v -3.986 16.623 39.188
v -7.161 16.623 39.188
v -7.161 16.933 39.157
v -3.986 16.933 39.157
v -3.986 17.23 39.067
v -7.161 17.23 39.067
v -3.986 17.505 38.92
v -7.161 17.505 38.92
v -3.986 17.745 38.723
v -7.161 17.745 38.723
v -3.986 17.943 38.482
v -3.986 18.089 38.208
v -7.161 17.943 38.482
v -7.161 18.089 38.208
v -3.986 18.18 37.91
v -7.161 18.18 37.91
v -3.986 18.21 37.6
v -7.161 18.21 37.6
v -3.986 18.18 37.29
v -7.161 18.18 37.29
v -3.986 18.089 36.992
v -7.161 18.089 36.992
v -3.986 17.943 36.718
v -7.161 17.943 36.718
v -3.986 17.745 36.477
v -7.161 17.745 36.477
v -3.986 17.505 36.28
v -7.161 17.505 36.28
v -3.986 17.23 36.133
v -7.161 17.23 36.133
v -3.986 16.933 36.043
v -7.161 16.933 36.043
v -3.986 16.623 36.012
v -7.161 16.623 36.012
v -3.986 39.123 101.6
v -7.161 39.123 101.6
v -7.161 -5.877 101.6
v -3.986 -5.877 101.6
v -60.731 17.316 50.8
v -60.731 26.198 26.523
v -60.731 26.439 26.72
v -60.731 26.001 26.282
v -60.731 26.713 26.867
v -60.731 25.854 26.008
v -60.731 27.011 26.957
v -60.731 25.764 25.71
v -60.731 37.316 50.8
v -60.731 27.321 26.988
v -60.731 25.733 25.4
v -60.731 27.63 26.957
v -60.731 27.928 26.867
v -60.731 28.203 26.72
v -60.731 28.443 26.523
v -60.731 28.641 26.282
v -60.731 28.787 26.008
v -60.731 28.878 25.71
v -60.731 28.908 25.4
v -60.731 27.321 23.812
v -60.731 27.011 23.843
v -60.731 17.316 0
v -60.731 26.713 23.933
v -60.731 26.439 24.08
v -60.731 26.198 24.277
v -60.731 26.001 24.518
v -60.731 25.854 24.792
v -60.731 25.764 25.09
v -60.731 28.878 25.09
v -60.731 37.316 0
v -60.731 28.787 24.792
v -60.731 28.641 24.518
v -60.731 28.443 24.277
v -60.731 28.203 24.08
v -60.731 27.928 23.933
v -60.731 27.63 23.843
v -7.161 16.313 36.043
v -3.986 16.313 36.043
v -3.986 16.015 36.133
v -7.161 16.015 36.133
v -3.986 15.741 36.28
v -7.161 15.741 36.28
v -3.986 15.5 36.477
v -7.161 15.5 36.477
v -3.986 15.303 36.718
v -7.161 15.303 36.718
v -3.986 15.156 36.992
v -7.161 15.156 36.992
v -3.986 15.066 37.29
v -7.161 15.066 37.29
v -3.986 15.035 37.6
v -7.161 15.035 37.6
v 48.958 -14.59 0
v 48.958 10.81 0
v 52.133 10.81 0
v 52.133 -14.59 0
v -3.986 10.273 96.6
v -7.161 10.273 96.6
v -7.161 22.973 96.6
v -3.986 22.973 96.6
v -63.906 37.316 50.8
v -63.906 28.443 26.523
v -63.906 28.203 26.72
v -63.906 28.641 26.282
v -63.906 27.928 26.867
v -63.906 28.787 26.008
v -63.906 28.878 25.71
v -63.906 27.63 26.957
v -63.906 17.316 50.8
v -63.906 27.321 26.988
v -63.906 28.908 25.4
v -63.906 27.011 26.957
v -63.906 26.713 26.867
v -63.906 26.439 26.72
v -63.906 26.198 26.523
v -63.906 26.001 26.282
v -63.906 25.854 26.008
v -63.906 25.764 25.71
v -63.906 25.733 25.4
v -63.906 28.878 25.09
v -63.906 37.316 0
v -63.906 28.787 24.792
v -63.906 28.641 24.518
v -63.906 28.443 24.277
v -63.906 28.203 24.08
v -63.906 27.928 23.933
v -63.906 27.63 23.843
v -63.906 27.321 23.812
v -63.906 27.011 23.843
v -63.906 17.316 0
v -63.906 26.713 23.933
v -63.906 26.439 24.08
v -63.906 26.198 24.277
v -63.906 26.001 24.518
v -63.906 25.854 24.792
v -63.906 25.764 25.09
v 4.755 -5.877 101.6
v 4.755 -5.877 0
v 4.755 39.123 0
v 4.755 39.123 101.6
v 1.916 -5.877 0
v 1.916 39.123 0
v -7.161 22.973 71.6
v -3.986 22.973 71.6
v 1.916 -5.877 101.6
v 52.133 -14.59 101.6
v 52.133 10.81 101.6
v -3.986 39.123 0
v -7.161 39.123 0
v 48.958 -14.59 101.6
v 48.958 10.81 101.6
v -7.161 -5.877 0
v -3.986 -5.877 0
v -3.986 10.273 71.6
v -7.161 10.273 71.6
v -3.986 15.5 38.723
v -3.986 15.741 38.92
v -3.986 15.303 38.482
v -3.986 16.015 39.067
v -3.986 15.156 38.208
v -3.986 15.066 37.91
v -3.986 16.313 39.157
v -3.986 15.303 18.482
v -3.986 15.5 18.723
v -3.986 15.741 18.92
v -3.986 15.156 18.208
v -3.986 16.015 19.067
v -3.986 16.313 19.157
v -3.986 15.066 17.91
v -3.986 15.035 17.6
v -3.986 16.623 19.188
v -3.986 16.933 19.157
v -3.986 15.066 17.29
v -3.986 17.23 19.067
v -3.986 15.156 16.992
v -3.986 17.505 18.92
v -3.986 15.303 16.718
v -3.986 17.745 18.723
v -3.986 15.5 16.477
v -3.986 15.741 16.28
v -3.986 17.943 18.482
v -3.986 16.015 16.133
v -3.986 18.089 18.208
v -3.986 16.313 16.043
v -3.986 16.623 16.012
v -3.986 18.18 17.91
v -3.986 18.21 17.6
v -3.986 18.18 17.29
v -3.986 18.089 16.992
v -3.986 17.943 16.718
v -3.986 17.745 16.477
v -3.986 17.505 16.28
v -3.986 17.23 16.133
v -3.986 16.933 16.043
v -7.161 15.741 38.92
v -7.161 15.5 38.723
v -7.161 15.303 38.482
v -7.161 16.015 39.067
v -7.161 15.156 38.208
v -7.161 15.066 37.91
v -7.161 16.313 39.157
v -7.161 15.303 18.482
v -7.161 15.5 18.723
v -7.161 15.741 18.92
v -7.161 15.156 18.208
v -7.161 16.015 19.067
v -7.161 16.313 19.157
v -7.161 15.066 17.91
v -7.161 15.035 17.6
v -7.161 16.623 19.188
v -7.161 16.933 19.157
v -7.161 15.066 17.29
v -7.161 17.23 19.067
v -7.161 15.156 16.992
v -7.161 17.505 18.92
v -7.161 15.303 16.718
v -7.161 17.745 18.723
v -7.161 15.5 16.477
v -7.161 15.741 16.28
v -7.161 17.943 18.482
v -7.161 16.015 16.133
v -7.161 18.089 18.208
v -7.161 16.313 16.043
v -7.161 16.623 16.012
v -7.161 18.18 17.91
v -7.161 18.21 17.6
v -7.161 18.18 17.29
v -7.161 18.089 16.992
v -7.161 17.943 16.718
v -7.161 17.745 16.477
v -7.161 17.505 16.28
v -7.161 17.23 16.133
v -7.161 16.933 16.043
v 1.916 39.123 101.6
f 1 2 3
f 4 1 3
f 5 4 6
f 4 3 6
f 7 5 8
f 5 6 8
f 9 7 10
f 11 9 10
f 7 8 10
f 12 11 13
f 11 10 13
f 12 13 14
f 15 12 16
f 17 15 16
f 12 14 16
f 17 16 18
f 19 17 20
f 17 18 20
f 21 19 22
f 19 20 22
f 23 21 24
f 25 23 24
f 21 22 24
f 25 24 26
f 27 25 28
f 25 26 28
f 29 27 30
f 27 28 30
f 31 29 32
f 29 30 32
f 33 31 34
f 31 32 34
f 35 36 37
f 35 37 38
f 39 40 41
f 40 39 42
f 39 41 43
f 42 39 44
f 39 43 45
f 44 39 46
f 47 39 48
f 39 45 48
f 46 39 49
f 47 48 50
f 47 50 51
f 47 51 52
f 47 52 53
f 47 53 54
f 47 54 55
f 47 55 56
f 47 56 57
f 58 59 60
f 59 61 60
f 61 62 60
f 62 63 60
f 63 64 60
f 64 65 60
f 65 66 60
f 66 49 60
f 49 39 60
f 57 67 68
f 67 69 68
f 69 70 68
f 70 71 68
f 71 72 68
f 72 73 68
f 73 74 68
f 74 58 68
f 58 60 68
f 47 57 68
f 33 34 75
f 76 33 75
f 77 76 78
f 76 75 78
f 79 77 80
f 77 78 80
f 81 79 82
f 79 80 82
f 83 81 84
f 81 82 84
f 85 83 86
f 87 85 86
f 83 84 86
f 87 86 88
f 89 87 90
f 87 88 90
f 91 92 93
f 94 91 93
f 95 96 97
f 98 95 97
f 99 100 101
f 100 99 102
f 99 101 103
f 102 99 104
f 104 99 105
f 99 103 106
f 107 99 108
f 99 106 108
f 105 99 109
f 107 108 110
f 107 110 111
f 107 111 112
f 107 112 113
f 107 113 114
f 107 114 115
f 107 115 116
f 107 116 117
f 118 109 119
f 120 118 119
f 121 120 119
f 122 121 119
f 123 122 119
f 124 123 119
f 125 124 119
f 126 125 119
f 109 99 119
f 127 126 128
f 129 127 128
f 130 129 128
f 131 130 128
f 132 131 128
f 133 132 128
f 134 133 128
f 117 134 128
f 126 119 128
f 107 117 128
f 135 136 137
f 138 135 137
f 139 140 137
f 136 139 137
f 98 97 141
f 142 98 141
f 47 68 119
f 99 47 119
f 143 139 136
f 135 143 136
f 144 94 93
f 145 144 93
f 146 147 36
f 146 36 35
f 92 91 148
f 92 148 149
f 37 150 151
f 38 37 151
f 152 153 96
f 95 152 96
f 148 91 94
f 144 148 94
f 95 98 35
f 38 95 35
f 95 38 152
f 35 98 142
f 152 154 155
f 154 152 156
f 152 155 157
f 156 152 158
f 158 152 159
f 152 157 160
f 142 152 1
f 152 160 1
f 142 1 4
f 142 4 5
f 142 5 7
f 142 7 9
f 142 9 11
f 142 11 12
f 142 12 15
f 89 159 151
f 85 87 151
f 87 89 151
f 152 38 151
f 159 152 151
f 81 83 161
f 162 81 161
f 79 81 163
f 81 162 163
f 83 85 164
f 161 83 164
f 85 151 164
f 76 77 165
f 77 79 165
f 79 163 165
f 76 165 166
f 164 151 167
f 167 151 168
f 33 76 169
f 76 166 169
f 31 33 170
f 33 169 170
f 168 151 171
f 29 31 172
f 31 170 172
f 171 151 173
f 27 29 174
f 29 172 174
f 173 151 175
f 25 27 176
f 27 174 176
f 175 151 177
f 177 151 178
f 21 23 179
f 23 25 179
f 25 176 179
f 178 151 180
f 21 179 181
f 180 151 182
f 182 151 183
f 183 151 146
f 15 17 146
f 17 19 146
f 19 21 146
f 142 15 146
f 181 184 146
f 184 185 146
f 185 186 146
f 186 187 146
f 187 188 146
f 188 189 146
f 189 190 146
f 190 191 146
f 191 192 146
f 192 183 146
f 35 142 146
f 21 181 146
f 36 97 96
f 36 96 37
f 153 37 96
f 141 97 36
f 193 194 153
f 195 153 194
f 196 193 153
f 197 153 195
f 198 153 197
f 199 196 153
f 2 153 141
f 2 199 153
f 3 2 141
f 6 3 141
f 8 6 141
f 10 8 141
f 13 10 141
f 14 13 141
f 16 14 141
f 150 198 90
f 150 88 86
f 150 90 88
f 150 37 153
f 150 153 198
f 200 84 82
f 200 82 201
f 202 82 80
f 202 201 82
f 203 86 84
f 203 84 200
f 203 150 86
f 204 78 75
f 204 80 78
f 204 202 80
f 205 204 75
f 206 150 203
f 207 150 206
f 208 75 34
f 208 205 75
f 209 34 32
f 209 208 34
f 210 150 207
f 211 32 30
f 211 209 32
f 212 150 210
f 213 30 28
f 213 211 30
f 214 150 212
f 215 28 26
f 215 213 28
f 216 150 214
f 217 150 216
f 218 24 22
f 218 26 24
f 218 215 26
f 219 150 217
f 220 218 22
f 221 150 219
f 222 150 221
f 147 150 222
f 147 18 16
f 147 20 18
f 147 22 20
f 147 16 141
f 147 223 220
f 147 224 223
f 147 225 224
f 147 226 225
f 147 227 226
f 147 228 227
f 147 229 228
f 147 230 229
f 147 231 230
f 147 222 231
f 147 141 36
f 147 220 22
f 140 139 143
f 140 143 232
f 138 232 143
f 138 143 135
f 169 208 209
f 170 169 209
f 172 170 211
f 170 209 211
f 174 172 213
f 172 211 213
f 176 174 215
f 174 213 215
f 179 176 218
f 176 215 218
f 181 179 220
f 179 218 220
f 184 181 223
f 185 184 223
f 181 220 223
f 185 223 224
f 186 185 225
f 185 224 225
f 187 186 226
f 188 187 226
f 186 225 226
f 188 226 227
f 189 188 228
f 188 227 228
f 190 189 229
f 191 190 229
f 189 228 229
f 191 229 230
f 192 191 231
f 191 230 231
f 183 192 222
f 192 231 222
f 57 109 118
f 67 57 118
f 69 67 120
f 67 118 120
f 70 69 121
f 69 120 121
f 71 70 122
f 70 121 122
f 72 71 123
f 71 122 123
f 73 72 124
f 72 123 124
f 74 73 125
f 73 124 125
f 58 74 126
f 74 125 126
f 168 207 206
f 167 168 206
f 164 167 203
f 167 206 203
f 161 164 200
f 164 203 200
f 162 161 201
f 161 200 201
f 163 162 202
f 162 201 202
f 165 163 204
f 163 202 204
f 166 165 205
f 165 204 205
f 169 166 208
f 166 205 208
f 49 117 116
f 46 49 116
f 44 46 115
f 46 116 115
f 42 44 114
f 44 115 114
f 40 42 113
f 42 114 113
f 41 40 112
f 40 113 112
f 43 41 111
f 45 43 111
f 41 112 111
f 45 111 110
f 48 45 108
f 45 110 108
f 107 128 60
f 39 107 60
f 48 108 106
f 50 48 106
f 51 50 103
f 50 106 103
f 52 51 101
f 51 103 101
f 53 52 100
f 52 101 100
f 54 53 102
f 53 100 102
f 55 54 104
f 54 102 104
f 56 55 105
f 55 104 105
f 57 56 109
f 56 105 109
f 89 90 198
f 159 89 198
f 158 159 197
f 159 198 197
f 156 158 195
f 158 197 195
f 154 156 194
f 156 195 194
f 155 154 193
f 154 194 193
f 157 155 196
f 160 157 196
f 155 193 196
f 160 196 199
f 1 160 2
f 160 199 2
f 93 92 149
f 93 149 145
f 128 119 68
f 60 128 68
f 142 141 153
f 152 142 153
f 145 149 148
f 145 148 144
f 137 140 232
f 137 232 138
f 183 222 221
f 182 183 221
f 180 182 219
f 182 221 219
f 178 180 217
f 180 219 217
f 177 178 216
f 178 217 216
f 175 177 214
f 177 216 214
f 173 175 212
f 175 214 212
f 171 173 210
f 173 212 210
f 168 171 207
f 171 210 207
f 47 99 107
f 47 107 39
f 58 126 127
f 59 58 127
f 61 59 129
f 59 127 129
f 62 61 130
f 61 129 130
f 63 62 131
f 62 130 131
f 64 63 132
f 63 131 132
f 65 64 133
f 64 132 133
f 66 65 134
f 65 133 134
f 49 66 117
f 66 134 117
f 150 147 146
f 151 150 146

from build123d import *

# Parameters (mm, degrees)
F0_W     = 2.8388235675
F0_H     = 45
F1_DEPTH = 101.6
F0_W_2   = 3.175
F0_W_3   = 1.5875
F0_H_2   = 20
F3_DEPTH = 3.175
F4_DEPTH = 50.8
F6_DEPTH = 3.175
F0_H_3   = 25.4
F7_DEPTH = 101.6


with BuildPart() as f1:
    # F0 (on Top) → F1 (new body)
    with BuildSketch(Plane.XY):
        with Locations((3.3352231996, 16.6228093921)):
            Rectangle(F0_W, F0_H)
    extrude(amount=F1_DEPTH)


with BuildPart() as f1b:
    # F0 (on Top) → F1, piece 2 (new body)
    with BuildSketch(Plane.XY):
        with Locations((-5.573452724, 16.6228093921)):
            Rectangle(F0_W_2, F0_H)
    extrude(amount=F1_DEPTH)

    # F2 (on face) → F3 (cut)
    with BuildSketch(Plane(origin=(-7.160952724, 0, 0), x_dir=(0, -1, 0), z_dir=(-1, 0, 0))):
        Polygon((-10.2728093921, 96.6), (-16.6228093921, 96.6), (-22.9728093921, 96.6), (-22.9728093921, 71.6), (-16.6228093921, 71.6), (-10.2728093921, 71.6), align=None)
        with BuildLine():
            Line((-16.6228093921, 37.6), (-16.6228093921, 39.1875))
            ThreePointArc((-16.6228093921, 39.1875), (-18.2103093921, 37.6), (-16.6228093921, 36.0125))
            Line((-16.6228093921, 36.0125), (-16.6228093921, 37.6))
        make_face()
        with BuildLine():
            ThreePointArc((-15.0353093921, 37.6), (-15.500277377, 38.7225320151), (-16.6228093921, 39.1875))
            Line((-16.6228093921, 39.1875), (-16.6228093921, 37.6))
            Line((-16.6228093921, 37.6), (-16.6228093921, 36.0125))
            ThreePointArc((-16.6228093921, 36.0125), (-15.500277377, 36.4774679849), (-15.0353093921, 37.6))
        make_face()
        with BuildLine():
            ThreePointArc((-15.0353093921, 17.6), (-15.500277377, 18.7225320151), (-16.6228093921, 19.1875))
            Line((-16.6228093921, 19.1875), (-16.6228093921, 17.6))
            Line((-16.6228093921, 17.6), (-16.6228093921, 16.0125))
            ThreePointArc((-16.6228093921, 16.0125), (-15.500277377, 16.4774679849), (-15.0353093921, 17.6))
        make_face()
        with BuildLine():
            Line((-16.6228093921, 17.6), (-16.6228093921, 19.1875))
            ThreePointArc((-16.6228093921, 19.1875), (-18.2103093921, 17.6), (-16.6228093921, 16.0125))
            Line((-16.6228093921, 16.0125), (-16.6228093921, 17.6))
        make_face()
    extrude(amount=-F3_DEPTH, mode=Mode.SUBTRACT)


with BuildPart() as f1c:
    # F0 (on Top) → F1, piece 3 (new body)
    with BuildSketch(Plane.XY):
        with Locations((-61.5249278784, 27.3155884445)):
            Rectangle(F0_W_3, F0_H_2)
        Polygon((-62.3186778784, 37.3155884445), (-63.9061778784, 37.3155884445), (-63.9061778784, 27.3155884445), (-63.9061778784, 17.3155884445), (-62.3186778784, 17.3155884445), align=None)
    extrude(amount=F1_DEPTH)

    # F4 (cut): a face of the model
    f4_faces = [f1c.faces().sort_by_distance(p)[0] for p in [
        (-62.3186778784, 27.3155884445, 101.6),
    ]]
    extrude(f4_faces, amount=-F4_DEPTH, mode=Mode.SUBTRACT)

    # F5 (on face) → F6 (cut)
    with BuildSketch(Plane(origin=(-63.9061778784, 0, 0), x_dir=(0, -1, 0), z_dir=(-1, 0, 0))):
        with BuildLine():
            Line((-27.3206884445, 26.9875), (-27.3206884445, 25.4))
            Line((-27.3206884445, 25.4), (-25.7331884445, 25.4))
            ThreePointArc((-25.7331884445, 25.4), (-26.1981564293, 26.5225320151), (-27.3206884445, 26.9875))
        make_face()
        with BuildLine():
            ThreePointArc((-27.3206884445, 26.9875), (-28.4432204596, 26.5225320151), (-28.9081884445, 25.4))
            Line((-28.9081884445, 25.4), (-27.3206884445, 25.4))
            Line((-27.3206884445, 25.4), (-27.3206884445, 26.9875))
        make_face()
        with BuildLine():
            Line((-27.3206884445, 25.4), (-28.9081884445, 25.4))
            ThreePointArc((-28.9081884445, 25.4), (-28.4432204596, 24.2774679849), (-27.3206884445, 23.8125))
            Line((-27.3206884445, 23.8125), (-27.3206884445, 25.4))
        make_face()
        with BuildLine():
            Line((-27.3206884445, 25.4), (-27.3206884445, 23.8125))
            ThreePointArc((-27.3206884445, 23.8125), (-26.1981564293, 24.2774679849), (-25.7331884445, 25.4))
            Line((-25.7331884445, 25.4), (-27.3206884445, 25.4))
        make_face()
    extrude(amount=-F6_DEPTH, mode=Mode.SUBTRACT)


with BuildPart() as f7:
    # F0 (on Top) → F7 (new body)
    with BuildSketch(Plane.XY):
        with Locations((50.5450655282, -1.8898154005)):
            Rectangle(F0_W_2, F0_H_3)
    extrude(amount=F7_DEPTH)


solid = Compound([f1.part, f1b.part, f1c.part, f7.part])
